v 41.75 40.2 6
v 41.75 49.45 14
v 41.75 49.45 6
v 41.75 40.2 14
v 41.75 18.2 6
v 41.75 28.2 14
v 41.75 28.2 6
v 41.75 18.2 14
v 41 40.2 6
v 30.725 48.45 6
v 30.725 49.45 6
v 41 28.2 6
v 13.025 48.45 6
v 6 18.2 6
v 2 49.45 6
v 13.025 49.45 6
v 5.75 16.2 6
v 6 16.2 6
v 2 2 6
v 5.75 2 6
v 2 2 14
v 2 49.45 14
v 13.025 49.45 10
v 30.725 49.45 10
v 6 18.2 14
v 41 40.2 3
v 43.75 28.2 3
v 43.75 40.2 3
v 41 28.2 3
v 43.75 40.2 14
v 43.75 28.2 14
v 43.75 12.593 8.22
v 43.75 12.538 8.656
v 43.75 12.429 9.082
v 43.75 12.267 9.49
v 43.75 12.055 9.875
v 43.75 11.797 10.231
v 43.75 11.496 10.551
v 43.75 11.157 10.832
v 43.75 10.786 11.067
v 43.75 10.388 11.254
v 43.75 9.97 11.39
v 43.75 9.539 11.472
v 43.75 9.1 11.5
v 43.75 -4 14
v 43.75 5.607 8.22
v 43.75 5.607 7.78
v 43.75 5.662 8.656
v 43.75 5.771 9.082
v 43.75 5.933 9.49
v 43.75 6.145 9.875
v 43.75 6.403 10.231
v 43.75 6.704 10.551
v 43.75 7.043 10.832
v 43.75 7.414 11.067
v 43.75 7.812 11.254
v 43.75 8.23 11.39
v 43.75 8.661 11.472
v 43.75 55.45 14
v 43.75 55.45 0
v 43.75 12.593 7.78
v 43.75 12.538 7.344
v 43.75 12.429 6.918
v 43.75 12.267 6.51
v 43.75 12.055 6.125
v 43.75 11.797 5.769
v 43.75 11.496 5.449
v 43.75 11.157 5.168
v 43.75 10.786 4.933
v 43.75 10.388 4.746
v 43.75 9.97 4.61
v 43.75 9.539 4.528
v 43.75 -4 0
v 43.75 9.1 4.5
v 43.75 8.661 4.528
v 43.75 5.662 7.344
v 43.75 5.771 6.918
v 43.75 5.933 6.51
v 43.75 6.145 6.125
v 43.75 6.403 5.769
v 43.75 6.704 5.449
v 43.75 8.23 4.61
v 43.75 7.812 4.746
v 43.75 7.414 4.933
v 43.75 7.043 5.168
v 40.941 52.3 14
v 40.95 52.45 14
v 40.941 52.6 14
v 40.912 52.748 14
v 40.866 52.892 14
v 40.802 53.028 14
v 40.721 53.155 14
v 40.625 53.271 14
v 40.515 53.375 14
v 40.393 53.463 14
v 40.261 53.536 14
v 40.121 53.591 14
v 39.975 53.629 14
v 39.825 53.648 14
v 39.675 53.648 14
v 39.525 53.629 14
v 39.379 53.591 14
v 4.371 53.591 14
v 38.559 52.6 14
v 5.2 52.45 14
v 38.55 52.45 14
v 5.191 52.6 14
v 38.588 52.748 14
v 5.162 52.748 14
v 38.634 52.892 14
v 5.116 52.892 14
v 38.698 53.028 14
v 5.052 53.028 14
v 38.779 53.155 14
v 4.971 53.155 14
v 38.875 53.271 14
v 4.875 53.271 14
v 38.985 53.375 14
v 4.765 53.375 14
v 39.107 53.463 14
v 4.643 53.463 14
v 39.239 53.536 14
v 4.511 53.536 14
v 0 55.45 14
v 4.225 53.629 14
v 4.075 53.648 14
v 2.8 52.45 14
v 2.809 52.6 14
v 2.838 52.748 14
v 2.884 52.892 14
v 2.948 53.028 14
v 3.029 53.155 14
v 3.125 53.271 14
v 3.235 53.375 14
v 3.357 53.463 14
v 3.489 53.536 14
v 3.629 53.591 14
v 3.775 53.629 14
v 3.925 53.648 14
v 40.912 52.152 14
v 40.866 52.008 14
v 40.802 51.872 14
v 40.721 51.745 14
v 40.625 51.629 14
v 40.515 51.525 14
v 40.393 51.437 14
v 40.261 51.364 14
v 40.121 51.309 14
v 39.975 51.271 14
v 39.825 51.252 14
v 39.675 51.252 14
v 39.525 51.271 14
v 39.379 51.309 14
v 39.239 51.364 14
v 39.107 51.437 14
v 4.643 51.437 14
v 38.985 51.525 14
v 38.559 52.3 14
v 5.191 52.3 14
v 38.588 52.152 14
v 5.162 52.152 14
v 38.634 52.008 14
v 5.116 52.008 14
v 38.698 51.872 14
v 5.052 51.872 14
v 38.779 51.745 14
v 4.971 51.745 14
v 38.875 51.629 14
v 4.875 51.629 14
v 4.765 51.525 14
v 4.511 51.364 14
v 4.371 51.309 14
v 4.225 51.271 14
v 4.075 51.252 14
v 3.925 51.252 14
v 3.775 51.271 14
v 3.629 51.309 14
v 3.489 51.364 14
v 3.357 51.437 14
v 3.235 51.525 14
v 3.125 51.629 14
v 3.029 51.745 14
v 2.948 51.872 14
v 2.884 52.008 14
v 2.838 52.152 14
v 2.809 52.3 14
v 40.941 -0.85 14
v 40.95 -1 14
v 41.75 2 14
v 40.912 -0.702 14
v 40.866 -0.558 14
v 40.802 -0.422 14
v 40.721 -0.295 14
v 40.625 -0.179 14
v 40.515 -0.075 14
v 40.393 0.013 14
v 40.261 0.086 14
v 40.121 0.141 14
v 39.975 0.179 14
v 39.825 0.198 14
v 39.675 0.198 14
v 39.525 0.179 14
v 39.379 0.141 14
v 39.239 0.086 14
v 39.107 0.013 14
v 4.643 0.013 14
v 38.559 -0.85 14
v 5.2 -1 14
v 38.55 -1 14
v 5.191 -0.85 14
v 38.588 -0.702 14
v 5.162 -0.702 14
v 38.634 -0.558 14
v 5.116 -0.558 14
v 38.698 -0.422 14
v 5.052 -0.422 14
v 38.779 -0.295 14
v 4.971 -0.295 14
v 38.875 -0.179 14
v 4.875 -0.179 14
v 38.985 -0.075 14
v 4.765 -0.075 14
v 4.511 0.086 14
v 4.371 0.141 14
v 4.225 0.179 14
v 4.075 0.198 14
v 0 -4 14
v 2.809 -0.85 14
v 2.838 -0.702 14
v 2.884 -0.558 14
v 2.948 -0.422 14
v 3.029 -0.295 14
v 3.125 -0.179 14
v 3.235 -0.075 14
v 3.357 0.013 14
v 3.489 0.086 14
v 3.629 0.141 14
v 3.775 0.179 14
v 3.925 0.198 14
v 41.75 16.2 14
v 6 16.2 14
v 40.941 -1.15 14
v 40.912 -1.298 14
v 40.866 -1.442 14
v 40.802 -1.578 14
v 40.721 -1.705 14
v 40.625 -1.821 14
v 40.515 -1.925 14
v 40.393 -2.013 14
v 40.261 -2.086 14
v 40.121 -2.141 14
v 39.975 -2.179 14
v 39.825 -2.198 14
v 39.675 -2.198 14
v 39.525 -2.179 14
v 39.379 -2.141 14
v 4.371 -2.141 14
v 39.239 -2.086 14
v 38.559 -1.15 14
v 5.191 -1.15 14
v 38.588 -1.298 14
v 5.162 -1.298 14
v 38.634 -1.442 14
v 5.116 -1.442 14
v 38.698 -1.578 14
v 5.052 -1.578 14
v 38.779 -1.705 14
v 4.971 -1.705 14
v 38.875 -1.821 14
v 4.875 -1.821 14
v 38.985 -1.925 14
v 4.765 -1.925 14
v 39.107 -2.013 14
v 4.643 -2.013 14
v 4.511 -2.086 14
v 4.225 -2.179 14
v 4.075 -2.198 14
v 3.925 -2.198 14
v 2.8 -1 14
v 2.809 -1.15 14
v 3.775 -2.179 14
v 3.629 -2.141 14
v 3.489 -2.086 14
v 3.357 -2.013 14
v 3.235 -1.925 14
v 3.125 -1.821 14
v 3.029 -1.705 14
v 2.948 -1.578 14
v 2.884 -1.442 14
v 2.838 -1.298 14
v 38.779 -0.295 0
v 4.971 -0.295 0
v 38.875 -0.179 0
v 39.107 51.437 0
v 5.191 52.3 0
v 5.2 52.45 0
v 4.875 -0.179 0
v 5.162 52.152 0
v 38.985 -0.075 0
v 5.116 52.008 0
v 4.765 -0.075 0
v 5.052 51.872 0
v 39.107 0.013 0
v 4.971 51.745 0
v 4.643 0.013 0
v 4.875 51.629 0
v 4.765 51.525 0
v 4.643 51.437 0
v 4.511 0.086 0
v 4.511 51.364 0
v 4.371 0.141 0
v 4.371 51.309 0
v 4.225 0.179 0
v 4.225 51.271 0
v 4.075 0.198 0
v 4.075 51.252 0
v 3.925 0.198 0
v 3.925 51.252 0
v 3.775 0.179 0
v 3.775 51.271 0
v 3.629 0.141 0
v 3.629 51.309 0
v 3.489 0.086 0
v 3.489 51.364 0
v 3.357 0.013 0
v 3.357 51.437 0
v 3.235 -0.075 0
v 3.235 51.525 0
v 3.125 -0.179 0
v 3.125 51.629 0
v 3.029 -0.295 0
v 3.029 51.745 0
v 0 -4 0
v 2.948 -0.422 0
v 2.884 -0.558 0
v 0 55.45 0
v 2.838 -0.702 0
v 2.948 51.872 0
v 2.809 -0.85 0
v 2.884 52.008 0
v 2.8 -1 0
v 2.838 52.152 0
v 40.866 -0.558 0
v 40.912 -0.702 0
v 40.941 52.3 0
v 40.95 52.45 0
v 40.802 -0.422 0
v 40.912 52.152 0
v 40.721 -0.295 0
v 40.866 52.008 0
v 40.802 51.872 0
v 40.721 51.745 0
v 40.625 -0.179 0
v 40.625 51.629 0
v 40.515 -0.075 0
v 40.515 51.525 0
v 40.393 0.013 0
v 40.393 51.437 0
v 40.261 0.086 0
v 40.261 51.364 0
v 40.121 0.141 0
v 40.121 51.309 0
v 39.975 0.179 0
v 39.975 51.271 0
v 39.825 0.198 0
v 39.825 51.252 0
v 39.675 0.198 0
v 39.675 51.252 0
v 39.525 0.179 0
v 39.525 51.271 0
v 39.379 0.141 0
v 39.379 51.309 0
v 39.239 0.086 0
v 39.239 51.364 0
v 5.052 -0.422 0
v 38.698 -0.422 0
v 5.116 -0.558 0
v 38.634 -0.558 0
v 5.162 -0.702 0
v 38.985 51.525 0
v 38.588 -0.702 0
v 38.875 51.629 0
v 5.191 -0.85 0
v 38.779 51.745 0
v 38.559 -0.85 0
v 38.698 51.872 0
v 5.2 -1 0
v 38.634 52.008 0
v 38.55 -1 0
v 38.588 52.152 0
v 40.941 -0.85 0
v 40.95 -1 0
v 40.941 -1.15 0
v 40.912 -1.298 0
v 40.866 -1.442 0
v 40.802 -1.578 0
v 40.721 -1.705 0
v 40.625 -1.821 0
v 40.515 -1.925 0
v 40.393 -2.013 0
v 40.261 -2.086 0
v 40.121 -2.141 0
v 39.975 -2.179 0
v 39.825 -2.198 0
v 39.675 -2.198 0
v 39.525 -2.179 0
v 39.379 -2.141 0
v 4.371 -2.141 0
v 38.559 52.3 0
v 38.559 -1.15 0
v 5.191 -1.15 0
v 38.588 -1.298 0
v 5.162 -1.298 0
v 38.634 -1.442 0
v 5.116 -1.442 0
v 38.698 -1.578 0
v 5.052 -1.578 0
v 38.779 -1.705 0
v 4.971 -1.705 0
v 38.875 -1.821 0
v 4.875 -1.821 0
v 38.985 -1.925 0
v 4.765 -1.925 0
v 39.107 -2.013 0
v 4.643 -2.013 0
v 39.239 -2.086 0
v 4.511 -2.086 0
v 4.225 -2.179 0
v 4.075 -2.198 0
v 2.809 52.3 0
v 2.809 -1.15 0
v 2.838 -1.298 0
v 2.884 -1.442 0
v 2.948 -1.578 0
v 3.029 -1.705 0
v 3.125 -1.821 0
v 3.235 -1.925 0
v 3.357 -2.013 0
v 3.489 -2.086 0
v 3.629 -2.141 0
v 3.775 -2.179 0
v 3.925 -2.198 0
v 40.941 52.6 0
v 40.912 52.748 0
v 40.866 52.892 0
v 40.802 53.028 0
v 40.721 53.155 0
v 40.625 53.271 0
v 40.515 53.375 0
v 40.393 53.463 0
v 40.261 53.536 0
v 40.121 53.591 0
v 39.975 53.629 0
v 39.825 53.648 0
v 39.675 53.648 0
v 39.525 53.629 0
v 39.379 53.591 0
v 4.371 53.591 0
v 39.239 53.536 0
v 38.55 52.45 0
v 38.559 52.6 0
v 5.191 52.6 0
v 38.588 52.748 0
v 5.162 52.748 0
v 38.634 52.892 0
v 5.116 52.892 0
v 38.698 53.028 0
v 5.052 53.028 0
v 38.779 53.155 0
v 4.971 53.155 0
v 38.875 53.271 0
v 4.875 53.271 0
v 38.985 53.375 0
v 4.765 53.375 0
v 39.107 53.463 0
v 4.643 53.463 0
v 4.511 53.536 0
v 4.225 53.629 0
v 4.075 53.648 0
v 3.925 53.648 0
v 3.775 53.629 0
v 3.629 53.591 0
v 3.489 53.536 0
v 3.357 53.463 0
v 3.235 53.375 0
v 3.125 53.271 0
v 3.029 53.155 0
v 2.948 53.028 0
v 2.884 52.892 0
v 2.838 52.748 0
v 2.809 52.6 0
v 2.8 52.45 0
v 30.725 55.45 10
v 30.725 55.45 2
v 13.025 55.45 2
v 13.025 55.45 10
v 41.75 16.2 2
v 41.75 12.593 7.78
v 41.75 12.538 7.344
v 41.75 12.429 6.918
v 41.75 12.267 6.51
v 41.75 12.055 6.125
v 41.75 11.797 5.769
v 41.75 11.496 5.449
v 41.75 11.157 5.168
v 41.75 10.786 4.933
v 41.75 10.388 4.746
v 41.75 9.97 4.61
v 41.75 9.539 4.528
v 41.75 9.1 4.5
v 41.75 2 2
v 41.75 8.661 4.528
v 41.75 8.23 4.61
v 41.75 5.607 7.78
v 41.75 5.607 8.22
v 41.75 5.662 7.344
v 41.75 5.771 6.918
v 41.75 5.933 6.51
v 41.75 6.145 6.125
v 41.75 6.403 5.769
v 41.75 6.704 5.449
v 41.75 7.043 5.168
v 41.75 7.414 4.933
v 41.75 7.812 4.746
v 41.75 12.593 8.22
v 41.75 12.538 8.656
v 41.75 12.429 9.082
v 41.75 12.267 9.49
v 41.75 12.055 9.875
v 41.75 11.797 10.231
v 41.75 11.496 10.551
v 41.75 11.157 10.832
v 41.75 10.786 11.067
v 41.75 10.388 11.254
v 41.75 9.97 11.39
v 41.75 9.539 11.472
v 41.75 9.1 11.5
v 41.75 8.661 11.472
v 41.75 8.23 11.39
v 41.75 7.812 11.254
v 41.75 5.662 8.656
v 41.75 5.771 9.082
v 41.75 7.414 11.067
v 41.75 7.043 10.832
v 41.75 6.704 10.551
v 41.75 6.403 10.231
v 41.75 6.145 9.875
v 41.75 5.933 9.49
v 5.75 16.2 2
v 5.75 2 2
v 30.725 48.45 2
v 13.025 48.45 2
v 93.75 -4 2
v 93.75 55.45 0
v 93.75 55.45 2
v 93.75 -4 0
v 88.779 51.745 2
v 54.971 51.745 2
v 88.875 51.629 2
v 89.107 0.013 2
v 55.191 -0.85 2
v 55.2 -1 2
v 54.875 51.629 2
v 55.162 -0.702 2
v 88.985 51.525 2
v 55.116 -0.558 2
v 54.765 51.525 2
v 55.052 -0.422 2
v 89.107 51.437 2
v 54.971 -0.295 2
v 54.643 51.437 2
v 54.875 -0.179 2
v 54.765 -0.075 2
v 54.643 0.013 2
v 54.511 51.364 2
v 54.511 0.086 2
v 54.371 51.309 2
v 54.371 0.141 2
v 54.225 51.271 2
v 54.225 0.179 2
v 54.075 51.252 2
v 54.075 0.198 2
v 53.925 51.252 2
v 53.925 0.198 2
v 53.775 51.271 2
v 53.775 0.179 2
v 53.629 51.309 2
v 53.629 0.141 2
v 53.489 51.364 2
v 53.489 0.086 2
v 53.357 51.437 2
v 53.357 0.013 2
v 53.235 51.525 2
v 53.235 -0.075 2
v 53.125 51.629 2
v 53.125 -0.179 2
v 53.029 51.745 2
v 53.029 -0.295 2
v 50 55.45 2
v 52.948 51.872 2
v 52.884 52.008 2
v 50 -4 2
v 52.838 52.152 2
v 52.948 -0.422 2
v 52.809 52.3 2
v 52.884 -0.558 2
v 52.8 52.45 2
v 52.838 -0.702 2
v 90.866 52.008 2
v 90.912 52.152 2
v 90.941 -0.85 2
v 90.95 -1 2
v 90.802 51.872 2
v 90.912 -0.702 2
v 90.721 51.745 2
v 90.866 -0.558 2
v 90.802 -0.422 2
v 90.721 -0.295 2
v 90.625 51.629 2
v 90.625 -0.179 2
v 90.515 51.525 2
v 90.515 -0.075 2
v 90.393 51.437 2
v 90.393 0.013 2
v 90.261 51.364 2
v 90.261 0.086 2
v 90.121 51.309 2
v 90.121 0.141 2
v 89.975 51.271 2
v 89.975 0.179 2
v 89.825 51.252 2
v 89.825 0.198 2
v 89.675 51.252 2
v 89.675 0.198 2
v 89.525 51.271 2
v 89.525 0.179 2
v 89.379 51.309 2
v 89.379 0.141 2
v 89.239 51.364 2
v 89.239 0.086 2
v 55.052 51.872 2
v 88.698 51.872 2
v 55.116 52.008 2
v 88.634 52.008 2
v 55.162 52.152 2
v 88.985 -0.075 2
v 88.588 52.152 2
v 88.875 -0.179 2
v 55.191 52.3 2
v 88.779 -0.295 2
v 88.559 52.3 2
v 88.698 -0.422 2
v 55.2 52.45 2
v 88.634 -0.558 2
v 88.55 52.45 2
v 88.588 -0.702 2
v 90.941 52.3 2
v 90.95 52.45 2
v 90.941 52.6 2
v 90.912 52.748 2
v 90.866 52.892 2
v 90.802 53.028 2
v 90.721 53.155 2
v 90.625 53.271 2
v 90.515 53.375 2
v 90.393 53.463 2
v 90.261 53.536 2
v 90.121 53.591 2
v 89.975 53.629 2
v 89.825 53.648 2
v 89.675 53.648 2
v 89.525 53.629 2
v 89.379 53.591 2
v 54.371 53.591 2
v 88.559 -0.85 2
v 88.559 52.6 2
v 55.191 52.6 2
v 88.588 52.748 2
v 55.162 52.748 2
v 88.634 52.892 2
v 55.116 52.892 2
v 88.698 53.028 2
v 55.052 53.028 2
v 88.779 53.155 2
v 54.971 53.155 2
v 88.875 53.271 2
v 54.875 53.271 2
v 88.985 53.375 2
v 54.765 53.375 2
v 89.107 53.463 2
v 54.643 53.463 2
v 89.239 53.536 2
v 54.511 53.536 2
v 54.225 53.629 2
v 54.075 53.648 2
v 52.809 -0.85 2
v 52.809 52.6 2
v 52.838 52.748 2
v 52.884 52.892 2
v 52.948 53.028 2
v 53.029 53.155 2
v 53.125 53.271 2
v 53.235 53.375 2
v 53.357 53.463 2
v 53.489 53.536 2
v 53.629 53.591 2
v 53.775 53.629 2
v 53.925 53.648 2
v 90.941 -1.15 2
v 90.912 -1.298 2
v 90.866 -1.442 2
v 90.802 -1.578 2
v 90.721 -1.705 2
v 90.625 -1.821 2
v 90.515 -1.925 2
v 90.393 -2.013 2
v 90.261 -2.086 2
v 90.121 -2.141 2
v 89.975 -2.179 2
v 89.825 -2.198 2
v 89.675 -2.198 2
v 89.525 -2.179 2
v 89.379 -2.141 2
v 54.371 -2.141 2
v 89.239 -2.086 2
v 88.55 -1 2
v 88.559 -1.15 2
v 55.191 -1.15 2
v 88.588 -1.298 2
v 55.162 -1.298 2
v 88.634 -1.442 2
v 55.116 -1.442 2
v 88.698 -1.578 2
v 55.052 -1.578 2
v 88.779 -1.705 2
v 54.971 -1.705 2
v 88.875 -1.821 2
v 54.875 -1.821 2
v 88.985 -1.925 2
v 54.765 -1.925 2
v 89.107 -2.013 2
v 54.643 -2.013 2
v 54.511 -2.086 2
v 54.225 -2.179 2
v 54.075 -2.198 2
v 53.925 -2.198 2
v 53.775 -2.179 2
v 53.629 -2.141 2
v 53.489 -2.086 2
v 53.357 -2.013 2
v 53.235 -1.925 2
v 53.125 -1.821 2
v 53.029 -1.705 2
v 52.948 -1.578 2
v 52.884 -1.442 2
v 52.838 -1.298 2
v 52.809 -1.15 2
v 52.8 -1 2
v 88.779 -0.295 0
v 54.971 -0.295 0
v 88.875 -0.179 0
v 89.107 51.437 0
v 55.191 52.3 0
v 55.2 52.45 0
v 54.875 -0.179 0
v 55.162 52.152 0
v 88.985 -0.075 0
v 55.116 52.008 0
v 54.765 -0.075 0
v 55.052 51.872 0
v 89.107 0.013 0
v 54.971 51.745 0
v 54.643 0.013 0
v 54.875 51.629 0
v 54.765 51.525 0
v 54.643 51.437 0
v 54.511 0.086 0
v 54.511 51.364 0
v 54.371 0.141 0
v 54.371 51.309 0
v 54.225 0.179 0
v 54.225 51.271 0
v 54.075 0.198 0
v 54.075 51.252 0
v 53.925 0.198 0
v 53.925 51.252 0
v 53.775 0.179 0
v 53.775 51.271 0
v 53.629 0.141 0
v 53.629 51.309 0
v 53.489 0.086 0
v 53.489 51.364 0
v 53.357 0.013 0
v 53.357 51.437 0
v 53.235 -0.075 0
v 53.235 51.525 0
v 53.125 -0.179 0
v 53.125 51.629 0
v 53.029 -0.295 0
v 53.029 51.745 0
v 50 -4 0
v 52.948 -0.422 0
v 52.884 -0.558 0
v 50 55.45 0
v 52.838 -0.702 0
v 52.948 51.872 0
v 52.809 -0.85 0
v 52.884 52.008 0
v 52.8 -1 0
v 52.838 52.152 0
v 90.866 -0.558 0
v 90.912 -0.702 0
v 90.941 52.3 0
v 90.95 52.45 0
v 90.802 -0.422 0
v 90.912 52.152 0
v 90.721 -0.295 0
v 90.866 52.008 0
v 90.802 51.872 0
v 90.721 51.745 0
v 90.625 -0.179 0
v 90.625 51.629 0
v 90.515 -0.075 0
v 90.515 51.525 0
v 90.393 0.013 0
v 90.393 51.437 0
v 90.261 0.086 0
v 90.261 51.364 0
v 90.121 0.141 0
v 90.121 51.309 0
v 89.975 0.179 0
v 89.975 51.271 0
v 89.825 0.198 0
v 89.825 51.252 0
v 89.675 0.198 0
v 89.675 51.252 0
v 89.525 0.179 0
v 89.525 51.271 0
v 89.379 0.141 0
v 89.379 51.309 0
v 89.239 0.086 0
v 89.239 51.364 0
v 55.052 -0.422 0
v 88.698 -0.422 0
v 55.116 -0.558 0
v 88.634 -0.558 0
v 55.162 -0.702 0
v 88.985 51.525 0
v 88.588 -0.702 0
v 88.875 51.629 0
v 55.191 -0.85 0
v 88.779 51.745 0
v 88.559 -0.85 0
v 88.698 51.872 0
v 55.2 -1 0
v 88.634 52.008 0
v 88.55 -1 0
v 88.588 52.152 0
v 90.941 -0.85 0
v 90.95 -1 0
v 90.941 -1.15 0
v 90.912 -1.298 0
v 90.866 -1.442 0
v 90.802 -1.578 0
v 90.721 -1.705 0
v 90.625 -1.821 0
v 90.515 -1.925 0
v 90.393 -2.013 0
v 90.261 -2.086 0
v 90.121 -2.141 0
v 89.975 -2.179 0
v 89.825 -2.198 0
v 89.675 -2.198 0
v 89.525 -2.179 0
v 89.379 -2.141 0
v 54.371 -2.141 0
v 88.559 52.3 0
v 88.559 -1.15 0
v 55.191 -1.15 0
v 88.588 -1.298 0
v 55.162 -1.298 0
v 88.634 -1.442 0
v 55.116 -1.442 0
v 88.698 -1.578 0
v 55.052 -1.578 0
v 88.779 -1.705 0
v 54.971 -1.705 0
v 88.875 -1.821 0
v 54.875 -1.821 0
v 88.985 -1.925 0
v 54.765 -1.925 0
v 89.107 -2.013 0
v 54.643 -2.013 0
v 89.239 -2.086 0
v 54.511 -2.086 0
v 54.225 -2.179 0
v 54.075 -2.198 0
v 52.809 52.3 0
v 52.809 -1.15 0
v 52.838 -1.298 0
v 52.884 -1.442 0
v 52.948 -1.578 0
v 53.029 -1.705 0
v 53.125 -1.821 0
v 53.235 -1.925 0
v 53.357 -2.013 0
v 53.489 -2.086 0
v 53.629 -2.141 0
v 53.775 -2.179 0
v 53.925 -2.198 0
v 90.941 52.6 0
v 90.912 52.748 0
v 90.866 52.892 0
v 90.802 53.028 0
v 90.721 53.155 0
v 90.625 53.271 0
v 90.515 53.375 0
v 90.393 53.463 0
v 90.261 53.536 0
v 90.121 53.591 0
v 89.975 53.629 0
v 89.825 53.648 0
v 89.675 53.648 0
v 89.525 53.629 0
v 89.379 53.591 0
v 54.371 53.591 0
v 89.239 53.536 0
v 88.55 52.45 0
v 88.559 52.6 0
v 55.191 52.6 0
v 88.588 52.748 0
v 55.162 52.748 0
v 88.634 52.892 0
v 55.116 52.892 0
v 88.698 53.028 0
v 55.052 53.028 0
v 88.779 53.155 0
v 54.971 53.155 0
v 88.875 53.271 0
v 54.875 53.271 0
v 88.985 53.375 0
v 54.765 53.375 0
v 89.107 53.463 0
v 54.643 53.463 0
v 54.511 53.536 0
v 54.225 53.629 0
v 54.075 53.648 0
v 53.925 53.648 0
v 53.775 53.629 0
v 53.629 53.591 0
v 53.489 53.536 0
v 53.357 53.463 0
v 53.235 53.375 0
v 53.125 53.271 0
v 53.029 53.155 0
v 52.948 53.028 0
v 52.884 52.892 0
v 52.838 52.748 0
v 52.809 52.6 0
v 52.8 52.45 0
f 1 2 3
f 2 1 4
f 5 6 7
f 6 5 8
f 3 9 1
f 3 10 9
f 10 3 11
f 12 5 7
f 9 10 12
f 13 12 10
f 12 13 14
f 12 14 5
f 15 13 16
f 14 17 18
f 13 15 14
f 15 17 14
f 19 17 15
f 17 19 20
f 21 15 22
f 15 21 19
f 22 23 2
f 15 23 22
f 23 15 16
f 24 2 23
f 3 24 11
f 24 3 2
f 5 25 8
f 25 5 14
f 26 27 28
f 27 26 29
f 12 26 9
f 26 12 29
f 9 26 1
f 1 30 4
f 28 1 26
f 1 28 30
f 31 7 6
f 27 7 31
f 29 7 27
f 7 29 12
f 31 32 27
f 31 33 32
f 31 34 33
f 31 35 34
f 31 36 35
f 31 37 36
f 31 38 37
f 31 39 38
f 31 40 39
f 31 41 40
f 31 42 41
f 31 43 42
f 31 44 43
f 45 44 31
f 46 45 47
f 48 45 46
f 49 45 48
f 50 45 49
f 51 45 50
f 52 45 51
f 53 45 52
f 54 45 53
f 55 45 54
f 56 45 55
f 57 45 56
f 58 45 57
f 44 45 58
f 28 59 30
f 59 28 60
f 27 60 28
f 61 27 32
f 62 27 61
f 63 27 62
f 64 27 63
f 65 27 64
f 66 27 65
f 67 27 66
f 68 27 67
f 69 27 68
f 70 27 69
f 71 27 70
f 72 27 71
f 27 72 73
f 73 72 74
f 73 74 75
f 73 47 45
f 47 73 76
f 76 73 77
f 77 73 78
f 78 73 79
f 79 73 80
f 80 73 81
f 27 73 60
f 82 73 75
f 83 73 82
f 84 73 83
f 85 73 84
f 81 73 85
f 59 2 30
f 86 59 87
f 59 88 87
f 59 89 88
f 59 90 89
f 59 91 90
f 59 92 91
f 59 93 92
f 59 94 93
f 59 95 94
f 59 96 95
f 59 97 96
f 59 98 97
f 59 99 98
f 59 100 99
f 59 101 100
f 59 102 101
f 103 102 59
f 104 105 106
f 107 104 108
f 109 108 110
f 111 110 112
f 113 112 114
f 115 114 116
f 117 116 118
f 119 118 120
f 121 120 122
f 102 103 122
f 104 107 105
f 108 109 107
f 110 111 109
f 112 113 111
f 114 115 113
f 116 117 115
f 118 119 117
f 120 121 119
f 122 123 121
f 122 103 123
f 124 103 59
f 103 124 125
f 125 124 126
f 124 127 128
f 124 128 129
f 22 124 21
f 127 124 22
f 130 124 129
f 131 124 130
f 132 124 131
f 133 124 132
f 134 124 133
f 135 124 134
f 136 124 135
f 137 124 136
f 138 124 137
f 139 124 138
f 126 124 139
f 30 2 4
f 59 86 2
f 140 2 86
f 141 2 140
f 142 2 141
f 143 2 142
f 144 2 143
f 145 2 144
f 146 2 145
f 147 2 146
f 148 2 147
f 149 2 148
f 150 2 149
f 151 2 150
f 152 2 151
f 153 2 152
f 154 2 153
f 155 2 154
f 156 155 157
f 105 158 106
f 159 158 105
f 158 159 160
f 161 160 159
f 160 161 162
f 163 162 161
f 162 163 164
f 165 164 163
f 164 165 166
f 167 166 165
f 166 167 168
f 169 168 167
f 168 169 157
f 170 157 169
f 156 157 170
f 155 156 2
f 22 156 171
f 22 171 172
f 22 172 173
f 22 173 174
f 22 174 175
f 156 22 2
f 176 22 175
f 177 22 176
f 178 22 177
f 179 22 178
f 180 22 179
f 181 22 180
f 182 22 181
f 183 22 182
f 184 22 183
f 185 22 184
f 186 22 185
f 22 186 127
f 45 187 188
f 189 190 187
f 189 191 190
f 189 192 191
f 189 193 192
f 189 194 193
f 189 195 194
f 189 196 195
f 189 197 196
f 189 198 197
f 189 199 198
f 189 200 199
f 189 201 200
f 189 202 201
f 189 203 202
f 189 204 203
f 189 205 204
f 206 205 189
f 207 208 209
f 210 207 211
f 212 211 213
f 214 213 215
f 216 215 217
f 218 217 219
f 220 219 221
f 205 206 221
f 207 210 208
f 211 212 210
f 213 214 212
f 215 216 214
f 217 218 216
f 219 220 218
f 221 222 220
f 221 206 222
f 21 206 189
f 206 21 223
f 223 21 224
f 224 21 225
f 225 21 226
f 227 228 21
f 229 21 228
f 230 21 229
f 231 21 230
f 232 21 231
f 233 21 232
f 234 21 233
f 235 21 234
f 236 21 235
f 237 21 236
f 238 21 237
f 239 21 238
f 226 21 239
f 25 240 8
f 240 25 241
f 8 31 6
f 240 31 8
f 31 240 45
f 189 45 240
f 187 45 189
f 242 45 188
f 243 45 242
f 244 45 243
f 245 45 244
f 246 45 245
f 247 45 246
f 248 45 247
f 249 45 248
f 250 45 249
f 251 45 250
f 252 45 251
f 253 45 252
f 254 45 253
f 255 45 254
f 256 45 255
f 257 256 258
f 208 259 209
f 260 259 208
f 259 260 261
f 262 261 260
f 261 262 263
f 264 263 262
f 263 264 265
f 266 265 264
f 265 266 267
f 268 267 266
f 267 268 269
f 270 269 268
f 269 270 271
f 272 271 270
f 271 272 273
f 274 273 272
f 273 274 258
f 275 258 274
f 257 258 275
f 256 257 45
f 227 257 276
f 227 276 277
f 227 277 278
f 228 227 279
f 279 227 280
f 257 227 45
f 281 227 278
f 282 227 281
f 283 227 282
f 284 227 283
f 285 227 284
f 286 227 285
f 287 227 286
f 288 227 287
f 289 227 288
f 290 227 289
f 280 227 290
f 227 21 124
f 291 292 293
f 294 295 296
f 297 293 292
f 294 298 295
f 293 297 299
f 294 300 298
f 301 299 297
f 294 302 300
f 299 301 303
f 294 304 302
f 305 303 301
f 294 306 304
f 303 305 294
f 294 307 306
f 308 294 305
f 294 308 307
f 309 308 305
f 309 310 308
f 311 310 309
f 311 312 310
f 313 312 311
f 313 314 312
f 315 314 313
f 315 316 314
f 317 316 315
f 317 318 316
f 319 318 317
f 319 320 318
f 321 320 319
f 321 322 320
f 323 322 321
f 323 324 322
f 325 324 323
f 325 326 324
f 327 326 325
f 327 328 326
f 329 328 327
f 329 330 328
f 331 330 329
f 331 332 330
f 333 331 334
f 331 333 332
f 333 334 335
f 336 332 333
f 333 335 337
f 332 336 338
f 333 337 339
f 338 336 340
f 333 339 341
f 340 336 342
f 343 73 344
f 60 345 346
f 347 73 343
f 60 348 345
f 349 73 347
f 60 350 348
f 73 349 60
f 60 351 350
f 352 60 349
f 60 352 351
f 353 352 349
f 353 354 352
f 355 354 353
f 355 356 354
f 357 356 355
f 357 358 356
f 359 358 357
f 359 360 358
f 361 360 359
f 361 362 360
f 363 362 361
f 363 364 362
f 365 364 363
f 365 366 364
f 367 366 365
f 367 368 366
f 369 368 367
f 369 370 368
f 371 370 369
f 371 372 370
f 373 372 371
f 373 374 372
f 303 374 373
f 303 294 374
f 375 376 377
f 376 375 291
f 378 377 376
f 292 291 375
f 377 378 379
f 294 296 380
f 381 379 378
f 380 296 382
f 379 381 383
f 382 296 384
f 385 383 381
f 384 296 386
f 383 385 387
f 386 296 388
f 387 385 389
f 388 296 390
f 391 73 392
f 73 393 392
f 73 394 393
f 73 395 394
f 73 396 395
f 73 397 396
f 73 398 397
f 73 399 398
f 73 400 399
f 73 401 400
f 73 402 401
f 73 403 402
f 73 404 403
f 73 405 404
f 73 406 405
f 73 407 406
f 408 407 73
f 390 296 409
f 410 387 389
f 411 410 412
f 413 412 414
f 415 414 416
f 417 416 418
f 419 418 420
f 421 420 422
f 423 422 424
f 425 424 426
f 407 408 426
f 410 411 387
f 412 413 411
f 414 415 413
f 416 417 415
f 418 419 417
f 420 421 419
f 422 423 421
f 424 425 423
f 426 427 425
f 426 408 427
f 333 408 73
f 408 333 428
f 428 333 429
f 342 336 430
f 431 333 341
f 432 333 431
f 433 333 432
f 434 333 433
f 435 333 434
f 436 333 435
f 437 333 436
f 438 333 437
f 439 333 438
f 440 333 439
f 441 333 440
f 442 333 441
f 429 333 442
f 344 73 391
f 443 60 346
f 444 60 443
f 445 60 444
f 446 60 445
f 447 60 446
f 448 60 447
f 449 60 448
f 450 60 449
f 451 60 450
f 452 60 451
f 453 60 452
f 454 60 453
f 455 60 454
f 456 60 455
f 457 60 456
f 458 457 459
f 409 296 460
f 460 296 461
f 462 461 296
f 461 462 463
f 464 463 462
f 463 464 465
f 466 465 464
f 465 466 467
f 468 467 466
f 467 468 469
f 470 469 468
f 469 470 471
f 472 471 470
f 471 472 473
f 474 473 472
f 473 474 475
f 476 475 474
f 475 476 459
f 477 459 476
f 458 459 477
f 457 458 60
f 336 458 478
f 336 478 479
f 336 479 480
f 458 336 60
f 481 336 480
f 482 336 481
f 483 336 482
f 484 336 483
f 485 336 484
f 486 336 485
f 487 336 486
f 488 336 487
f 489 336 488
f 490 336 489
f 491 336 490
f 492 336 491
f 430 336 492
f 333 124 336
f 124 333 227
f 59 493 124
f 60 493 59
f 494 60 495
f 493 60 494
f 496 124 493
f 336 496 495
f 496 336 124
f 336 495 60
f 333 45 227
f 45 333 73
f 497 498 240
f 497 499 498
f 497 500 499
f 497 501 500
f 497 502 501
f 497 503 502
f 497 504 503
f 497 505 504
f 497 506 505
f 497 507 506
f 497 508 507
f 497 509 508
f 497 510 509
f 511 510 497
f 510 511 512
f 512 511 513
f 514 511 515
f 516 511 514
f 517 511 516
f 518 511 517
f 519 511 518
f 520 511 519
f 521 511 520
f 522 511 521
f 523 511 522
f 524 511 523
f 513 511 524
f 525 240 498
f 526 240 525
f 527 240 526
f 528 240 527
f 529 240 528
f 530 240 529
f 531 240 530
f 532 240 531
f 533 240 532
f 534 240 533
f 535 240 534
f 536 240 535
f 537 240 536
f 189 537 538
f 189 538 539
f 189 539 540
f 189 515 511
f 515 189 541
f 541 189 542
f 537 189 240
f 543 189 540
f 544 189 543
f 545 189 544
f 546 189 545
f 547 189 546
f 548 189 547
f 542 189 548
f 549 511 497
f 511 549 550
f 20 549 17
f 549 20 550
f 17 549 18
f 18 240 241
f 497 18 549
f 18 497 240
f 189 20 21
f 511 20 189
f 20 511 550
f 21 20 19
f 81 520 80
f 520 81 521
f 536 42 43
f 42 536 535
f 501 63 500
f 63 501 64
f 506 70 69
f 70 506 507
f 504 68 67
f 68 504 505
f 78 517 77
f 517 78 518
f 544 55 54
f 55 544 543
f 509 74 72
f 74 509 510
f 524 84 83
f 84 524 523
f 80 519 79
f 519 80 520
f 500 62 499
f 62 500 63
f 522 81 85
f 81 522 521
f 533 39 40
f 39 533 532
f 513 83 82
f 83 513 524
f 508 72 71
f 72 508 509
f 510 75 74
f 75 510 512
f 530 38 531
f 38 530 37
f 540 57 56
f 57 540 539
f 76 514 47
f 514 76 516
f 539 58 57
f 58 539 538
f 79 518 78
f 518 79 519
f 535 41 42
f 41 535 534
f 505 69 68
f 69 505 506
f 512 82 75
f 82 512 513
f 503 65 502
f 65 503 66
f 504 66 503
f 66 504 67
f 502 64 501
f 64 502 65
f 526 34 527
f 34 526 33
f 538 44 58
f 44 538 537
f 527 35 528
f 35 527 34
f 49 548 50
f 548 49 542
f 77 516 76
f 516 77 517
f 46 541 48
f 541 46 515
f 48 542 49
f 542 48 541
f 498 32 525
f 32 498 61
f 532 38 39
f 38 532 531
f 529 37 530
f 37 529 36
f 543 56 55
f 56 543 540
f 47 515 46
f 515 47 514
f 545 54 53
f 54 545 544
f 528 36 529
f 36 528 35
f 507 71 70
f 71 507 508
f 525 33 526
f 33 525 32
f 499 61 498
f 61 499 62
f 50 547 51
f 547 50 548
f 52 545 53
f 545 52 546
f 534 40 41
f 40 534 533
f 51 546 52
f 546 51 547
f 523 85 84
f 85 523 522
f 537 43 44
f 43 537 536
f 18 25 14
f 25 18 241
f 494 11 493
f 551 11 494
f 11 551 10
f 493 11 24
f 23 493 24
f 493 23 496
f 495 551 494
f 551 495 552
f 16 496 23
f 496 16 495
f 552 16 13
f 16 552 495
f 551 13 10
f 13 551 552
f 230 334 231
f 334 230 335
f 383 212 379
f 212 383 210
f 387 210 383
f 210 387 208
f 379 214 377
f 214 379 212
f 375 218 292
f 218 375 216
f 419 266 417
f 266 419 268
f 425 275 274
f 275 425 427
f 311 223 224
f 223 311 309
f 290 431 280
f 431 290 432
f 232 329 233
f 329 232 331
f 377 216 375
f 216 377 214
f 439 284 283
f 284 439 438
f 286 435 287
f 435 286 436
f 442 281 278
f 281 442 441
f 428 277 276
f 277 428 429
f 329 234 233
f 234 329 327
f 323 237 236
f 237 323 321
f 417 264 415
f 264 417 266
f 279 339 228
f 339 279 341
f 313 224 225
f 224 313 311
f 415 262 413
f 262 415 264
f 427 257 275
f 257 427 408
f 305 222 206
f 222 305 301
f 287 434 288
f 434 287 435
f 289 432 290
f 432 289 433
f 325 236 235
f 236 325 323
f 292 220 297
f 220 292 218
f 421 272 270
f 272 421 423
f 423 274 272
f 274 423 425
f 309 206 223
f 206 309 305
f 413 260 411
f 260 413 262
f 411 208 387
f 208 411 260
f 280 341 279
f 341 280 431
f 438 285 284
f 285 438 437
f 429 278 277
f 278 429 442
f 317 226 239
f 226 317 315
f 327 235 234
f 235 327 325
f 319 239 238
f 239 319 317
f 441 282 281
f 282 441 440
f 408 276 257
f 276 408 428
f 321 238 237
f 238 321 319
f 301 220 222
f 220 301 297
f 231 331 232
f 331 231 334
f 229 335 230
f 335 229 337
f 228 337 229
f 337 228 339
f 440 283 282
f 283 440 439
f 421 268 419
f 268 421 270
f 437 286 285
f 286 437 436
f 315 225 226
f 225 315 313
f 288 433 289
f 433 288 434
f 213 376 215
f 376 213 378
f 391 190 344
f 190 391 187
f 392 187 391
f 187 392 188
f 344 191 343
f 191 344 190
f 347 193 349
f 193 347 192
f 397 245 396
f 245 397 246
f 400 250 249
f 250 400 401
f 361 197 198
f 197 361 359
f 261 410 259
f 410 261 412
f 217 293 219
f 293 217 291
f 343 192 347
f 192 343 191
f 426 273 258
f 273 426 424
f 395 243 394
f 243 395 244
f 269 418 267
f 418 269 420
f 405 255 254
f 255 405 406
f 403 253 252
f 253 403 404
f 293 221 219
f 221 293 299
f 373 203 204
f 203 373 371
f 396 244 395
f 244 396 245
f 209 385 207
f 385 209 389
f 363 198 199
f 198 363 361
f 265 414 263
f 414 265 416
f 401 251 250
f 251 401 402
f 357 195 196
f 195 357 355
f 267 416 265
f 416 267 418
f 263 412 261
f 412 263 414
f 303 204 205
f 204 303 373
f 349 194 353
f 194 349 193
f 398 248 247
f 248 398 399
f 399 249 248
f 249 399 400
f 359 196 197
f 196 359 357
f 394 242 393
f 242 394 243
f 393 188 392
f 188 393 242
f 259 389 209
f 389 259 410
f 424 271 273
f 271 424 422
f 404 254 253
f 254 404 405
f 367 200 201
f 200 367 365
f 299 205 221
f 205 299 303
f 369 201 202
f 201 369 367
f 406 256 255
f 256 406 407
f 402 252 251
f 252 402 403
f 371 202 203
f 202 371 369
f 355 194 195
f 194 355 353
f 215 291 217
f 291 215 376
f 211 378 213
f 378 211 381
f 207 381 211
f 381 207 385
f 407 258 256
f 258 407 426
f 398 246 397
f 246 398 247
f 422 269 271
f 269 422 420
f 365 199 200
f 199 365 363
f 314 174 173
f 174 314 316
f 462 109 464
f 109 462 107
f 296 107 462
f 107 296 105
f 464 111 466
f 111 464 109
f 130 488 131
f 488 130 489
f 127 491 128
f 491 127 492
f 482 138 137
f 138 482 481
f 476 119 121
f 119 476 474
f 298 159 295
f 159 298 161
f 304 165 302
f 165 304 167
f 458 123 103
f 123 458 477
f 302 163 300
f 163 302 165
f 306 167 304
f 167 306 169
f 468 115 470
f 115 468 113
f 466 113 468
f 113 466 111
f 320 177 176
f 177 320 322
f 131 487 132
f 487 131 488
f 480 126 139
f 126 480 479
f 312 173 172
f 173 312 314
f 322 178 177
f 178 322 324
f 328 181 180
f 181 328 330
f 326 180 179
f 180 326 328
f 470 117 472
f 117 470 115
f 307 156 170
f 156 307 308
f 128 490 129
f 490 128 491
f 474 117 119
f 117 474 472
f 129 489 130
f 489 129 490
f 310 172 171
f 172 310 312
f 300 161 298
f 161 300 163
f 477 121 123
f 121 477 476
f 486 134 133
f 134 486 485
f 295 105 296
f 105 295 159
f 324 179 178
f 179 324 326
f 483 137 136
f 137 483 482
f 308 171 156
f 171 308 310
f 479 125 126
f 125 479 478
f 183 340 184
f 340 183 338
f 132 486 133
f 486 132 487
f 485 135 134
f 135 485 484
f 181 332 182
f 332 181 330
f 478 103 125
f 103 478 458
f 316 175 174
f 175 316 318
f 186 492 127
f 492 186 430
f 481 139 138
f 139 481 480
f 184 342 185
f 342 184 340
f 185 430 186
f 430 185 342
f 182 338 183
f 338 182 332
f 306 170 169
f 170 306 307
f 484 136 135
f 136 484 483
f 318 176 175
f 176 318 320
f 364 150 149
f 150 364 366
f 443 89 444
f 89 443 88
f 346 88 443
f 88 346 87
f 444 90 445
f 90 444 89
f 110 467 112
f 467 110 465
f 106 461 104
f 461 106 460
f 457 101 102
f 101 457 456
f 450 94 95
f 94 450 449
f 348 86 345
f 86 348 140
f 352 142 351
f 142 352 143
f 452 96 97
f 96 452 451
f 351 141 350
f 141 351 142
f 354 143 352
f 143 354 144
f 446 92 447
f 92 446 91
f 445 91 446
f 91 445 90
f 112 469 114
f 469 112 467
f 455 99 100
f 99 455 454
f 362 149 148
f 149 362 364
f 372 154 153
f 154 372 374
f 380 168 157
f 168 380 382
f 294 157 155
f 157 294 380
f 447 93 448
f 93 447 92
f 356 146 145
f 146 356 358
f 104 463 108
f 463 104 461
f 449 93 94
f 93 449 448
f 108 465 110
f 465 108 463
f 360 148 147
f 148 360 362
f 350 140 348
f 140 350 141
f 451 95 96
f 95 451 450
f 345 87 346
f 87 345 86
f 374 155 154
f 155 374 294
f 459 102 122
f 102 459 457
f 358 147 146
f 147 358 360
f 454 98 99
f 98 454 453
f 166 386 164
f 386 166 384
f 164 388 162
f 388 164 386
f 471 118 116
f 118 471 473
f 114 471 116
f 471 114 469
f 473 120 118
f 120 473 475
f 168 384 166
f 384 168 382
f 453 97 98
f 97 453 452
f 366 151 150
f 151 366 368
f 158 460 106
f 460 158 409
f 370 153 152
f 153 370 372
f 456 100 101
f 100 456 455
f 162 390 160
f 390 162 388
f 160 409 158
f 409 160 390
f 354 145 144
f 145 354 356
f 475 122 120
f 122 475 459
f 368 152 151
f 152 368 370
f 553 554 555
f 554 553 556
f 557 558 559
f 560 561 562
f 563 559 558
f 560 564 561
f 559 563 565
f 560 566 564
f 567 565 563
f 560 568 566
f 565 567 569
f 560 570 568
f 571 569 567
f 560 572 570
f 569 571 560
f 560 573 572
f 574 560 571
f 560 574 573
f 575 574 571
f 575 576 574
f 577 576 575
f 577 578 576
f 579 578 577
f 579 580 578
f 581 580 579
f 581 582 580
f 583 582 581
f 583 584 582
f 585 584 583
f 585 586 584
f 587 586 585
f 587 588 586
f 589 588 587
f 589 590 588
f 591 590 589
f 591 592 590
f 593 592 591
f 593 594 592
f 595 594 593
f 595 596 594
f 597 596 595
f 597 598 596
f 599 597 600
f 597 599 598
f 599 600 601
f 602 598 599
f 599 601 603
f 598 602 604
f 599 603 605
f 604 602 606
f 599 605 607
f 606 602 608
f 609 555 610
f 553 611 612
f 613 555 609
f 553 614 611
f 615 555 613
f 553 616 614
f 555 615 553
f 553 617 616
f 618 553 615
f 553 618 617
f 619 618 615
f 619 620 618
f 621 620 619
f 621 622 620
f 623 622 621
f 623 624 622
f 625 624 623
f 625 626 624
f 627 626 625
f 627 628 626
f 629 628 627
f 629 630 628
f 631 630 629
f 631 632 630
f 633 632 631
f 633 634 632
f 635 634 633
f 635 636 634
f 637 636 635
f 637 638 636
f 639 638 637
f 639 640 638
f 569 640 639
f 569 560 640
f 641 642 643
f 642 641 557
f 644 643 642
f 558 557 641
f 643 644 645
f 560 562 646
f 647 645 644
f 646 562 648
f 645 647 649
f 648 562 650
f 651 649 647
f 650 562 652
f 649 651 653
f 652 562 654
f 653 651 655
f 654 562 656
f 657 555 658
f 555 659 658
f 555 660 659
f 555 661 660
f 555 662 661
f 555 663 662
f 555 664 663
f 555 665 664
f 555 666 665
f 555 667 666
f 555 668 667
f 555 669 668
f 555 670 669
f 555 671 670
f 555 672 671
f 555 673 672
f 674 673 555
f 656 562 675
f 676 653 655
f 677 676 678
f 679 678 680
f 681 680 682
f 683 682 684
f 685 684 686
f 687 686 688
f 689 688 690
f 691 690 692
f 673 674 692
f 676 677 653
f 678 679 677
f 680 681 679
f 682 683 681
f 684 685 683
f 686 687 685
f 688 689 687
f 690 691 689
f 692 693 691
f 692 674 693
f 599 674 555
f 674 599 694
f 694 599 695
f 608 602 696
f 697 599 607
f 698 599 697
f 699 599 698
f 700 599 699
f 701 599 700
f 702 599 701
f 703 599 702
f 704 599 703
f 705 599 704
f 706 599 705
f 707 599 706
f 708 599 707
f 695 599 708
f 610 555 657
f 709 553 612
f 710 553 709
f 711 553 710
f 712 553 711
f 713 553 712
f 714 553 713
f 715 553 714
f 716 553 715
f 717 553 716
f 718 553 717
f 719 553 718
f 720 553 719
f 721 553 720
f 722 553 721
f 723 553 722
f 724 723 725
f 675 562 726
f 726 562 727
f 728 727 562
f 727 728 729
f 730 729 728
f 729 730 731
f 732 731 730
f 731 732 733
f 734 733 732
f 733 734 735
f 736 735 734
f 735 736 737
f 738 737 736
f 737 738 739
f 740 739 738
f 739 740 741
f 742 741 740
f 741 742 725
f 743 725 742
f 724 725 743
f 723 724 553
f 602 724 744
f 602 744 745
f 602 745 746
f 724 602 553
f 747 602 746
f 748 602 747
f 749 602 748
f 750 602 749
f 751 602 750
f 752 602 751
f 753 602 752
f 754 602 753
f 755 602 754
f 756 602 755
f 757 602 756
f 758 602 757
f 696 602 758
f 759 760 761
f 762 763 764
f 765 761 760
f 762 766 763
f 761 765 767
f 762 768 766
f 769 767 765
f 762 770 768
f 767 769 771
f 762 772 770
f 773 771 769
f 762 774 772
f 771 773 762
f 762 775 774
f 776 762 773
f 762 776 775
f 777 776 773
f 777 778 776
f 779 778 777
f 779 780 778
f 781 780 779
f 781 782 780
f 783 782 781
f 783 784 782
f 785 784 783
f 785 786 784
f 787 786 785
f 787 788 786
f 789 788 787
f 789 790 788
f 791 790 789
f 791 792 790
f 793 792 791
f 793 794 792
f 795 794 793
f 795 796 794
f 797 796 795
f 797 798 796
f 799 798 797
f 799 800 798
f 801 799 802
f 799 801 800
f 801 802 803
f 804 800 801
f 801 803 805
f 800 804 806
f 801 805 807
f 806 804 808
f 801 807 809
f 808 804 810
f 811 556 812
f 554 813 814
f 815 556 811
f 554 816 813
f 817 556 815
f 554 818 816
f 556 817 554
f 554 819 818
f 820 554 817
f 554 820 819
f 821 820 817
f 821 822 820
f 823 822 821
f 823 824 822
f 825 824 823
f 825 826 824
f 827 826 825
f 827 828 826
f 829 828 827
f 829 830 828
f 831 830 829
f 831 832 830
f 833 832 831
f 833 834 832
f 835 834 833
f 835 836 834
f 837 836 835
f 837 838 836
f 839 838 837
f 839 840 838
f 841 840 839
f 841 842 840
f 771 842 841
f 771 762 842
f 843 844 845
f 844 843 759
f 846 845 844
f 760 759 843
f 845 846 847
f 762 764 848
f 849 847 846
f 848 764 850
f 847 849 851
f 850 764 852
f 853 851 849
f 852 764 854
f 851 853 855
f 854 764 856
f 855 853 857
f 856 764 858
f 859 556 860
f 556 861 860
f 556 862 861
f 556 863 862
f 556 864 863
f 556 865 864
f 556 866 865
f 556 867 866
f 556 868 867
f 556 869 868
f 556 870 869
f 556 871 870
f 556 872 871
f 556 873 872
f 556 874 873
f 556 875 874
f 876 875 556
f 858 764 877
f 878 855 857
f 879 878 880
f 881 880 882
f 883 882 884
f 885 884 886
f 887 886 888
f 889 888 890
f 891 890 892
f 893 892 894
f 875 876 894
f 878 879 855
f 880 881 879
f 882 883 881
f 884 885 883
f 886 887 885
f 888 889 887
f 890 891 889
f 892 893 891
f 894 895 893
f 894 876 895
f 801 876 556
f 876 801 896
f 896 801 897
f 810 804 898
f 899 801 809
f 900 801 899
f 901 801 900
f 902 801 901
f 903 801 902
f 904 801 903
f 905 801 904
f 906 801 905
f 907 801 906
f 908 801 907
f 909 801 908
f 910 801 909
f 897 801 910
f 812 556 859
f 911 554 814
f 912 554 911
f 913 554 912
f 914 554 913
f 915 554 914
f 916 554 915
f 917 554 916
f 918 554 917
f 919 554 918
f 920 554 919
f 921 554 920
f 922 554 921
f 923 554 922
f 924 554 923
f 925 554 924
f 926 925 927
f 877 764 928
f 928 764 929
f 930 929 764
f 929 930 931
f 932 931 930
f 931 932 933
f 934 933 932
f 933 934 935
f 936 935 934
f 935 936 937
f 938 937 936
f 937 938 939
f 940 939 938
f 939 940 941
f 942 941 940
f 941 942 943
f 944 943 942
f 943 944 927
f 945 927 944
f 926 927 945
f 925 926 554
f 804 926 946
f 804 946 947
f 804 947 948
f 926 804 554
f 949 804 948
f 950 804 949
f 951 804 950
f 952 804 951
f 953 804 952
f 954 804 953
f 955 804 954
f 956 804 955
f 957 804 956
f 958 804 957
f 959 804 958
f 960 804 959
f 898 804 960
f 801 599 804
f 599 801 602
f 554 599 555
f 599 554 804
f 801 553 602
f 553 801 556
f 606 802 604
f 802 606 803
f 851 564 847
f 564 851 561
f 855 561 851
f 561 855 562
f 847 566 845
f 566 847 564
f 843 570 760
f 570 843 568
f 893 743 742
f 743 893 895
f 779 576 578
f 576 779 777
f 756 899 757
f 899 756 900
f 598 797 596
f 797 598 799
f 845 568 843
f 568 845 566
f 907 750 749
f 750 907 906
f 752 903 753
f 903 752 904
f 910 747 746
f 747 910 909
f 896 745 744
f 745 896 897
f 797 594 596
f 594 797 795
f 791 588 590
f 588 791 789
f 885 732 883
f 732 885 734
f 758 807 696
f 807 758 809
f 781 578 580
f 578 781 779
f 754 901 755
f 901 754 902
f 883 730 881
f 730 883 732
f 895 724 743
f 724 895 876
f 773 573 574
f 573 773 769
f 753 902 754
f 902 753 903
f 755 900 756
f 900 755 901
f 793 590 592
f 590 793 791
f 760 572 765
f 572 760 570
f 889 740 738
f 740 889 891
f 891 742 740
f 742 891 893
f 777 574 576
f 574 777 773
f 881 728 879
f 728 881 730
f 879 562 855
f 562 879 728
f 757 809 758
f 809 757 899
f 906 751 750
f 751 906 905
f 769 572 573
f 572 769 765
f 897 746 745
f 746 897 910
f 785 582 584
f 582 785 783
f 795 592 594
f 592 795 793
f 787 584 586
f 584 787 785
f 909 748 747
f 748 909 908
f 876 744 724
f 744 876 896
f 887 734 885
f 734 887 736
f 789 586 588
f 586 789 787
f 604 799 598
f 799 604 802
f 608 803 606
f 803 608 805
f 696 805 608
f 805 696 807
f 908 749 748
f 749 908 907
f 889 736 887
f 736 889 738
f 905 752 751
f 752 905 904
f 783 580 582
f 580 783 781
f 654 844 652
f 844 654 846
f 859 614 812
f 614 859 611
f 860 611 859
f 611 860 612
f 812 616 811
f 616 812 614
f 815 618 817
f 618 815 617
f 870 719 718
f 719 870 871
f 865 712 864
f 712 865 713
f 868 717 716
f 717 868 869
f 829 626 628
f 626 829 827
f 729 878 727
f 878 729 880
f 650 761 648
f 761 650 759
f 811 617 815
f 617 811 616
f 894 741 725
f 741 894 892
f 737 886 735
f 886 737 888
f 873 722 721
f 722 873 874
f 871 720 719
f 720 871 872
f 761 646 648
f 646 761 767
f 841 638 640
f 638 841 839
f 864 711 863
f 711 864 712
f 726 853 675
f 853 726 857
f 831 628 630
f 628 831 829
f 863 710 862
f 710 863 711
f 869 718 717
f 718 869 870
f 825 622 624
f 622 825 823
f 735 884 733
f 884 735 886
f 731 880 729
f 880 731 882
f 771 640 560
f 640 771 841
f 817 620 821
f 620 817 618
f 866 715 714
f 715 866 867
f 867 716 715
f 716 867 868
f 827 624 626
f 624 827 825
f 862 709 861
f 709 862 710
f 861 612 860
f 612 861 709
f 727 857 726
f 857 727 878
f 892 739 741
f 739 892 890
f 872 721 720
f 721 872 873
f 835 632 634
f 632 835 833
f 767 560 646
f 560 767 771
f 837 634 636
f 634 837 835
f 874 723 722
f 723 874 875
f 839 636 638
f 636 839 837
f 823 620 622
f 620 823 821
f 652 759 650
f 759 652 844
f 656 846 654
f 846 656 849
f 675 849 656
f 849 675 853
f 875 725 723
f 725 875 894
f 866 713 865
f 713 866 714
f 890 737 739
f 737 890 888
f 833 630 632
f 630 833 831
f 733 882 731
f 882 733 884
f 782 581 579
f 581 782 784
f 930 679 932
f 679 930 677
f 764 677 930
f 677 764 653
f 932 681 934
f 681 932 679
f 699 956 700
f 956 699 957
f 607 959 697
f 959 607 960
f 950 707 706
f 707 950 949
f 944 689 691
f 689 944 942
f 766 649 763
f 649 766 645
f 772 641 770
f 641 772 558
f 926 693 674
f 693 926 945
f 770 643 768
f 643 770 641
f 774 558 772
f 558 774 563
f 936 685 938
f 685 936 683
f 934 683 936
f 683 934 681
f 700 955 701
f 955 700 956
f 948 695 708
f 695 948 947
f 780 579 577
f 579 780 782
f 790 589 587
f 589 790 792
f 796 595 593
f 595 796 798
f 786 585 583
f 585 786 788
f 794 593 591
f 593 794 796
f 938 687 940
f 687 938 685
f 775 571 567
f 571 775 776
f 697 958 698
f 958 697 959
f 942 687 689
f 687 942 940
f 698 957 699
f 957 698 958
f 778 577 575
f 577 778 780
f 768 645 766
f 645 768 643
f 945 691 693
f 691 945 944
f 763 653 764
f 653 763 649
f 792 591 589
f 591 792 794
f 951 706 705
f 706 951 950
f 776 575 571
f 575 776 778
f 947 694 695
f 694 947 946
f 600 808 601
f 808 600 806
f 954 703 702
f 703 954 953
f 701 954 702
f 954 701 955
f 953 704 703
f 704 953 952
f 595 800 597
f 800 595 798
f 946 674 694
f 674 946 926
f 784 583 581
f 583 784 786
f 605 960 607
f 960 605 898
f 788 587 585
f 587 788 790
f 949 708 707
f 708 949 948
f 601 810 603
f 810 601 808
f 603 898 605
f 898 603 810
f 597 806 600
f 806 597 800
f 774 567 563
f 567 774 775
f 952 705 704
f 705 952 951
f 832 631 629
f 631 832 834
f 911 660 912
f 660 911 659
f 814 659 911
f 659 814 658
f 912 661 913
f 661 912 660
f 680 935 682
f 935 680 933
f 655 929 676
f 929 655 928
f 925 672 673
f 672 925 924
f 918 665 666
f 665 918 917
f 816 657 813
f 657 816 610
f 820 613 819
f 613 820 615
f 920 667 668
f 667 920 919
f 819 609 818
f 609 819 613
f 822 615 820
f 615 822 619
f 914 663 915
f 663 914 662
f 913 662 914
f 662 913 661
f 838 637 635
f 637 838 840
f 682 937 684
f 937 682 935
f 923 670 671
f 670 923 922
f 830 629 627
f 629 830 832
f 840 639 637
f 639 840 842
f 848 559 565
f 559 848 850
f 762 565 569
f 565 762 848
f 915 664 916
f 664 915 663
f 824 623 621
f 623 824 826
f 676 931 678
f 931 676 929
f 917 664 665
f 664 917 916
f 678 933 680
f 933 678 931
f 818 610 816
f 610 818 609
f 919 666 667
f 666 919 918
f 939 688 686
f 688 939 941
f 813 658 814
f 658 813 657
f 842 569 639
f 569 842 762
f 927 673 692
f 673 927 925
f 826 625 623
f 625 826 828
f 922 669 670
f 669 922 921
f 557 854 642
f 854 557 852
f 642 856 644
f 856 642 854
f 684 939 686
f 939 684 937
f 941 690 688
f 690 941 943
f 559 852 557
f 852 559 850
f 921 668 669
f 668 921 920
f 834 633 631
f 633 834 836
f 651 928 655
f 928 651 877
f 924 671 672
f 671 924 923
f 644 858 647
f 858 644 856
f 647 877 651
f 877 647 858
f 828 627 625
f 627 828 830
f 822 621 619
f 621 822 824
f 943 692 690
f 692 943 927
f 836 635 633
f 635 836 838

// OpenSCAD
esp32_x = 39.75;
esp32_y = 31.25;
esp32_z = 8;
barrel_x = 36;
barrel_y = 14.2;
barrel_z = 13;
barrel_d = 7;
wall = 2;

screw_d = 2.4;

$fn = 50;

difference(){
//Body
translate([0,-4,0]){    
cube([esp32_x+ 2*wall,3*wall+barrel_y+esp32_y+4+4,barrel_z - 1 +wall]);
}
//Barrel Jack
translate([esp32_x - barrel_x + wall,wall,wall]){
cube([barrel_x,barrel_y,barrel_z]);
}
//Barrel Jack Hole
translate([esp32_x,wall+(barrel_y/2),wall+6]){
rotate([0,90,0]){
cylinder(d=barrel_d,h=5);
}
//Barrel Jack Leads
}
translate([2,2,6]){
cube([4,3+14.2,10]);
}
//ESP32 Board
translate([2,2+2+14.2,14-8]){
cube([39.75,31.25,9]);
//USB
translate([39,10,-3]){
cube([10,12,12]);
}
}
//LED Channel
translate([(39.75+4)/2 - (17.7/2),3+14.2+31.25,2]){
cube([17.7,4+4,8]);
}
translate([4,-1,-1]){
cylinder(d=screw_d,h=barrel_z+4);
}
translate([esp32_x+ 2*wall - 4,-1,-1]){
cylinder(d=screw_d,h=barrel_z+4);
}
translate([4,3*wall+barrel_y+esp32_y+4-3,-1]){
cylinder(d=screw_d,h=barrel_z+4);
}
translate([esp32_x+ 2*wall - 4,3*wall+barrel_y+esp32_y+4-3,-1]){
cylinder(d=screw_d,h=barrel_z+4);
}
}





//top
translate([50,0,0]){
difference(){
//Body
translate([0,-4,0]){    
cube([esp32_x+ 2*wall,3*wall+barrel_y+esp32_y+4+4,wall]);
}
translate([4,-1,-1]){
cylinder(d=screw_d,h=barrel_z+4);
}
translate([esp32_x+ 2*wall - 4,-1,-1]){
cylinder(d=screw_d,h=barrel_z+4);
}
translate([4,3*wall+barrel_y+esp32_y+4-3,-1]){
cylinder(d=screw_d,h=barrel_z+4);
}
translate([esp32_x+ 2*wall - 4,3*wall+barrel_y+esp32_y+4-3,-1]){
cylinder(d=screw_d,h=barrel_z+4);
}
}
}
